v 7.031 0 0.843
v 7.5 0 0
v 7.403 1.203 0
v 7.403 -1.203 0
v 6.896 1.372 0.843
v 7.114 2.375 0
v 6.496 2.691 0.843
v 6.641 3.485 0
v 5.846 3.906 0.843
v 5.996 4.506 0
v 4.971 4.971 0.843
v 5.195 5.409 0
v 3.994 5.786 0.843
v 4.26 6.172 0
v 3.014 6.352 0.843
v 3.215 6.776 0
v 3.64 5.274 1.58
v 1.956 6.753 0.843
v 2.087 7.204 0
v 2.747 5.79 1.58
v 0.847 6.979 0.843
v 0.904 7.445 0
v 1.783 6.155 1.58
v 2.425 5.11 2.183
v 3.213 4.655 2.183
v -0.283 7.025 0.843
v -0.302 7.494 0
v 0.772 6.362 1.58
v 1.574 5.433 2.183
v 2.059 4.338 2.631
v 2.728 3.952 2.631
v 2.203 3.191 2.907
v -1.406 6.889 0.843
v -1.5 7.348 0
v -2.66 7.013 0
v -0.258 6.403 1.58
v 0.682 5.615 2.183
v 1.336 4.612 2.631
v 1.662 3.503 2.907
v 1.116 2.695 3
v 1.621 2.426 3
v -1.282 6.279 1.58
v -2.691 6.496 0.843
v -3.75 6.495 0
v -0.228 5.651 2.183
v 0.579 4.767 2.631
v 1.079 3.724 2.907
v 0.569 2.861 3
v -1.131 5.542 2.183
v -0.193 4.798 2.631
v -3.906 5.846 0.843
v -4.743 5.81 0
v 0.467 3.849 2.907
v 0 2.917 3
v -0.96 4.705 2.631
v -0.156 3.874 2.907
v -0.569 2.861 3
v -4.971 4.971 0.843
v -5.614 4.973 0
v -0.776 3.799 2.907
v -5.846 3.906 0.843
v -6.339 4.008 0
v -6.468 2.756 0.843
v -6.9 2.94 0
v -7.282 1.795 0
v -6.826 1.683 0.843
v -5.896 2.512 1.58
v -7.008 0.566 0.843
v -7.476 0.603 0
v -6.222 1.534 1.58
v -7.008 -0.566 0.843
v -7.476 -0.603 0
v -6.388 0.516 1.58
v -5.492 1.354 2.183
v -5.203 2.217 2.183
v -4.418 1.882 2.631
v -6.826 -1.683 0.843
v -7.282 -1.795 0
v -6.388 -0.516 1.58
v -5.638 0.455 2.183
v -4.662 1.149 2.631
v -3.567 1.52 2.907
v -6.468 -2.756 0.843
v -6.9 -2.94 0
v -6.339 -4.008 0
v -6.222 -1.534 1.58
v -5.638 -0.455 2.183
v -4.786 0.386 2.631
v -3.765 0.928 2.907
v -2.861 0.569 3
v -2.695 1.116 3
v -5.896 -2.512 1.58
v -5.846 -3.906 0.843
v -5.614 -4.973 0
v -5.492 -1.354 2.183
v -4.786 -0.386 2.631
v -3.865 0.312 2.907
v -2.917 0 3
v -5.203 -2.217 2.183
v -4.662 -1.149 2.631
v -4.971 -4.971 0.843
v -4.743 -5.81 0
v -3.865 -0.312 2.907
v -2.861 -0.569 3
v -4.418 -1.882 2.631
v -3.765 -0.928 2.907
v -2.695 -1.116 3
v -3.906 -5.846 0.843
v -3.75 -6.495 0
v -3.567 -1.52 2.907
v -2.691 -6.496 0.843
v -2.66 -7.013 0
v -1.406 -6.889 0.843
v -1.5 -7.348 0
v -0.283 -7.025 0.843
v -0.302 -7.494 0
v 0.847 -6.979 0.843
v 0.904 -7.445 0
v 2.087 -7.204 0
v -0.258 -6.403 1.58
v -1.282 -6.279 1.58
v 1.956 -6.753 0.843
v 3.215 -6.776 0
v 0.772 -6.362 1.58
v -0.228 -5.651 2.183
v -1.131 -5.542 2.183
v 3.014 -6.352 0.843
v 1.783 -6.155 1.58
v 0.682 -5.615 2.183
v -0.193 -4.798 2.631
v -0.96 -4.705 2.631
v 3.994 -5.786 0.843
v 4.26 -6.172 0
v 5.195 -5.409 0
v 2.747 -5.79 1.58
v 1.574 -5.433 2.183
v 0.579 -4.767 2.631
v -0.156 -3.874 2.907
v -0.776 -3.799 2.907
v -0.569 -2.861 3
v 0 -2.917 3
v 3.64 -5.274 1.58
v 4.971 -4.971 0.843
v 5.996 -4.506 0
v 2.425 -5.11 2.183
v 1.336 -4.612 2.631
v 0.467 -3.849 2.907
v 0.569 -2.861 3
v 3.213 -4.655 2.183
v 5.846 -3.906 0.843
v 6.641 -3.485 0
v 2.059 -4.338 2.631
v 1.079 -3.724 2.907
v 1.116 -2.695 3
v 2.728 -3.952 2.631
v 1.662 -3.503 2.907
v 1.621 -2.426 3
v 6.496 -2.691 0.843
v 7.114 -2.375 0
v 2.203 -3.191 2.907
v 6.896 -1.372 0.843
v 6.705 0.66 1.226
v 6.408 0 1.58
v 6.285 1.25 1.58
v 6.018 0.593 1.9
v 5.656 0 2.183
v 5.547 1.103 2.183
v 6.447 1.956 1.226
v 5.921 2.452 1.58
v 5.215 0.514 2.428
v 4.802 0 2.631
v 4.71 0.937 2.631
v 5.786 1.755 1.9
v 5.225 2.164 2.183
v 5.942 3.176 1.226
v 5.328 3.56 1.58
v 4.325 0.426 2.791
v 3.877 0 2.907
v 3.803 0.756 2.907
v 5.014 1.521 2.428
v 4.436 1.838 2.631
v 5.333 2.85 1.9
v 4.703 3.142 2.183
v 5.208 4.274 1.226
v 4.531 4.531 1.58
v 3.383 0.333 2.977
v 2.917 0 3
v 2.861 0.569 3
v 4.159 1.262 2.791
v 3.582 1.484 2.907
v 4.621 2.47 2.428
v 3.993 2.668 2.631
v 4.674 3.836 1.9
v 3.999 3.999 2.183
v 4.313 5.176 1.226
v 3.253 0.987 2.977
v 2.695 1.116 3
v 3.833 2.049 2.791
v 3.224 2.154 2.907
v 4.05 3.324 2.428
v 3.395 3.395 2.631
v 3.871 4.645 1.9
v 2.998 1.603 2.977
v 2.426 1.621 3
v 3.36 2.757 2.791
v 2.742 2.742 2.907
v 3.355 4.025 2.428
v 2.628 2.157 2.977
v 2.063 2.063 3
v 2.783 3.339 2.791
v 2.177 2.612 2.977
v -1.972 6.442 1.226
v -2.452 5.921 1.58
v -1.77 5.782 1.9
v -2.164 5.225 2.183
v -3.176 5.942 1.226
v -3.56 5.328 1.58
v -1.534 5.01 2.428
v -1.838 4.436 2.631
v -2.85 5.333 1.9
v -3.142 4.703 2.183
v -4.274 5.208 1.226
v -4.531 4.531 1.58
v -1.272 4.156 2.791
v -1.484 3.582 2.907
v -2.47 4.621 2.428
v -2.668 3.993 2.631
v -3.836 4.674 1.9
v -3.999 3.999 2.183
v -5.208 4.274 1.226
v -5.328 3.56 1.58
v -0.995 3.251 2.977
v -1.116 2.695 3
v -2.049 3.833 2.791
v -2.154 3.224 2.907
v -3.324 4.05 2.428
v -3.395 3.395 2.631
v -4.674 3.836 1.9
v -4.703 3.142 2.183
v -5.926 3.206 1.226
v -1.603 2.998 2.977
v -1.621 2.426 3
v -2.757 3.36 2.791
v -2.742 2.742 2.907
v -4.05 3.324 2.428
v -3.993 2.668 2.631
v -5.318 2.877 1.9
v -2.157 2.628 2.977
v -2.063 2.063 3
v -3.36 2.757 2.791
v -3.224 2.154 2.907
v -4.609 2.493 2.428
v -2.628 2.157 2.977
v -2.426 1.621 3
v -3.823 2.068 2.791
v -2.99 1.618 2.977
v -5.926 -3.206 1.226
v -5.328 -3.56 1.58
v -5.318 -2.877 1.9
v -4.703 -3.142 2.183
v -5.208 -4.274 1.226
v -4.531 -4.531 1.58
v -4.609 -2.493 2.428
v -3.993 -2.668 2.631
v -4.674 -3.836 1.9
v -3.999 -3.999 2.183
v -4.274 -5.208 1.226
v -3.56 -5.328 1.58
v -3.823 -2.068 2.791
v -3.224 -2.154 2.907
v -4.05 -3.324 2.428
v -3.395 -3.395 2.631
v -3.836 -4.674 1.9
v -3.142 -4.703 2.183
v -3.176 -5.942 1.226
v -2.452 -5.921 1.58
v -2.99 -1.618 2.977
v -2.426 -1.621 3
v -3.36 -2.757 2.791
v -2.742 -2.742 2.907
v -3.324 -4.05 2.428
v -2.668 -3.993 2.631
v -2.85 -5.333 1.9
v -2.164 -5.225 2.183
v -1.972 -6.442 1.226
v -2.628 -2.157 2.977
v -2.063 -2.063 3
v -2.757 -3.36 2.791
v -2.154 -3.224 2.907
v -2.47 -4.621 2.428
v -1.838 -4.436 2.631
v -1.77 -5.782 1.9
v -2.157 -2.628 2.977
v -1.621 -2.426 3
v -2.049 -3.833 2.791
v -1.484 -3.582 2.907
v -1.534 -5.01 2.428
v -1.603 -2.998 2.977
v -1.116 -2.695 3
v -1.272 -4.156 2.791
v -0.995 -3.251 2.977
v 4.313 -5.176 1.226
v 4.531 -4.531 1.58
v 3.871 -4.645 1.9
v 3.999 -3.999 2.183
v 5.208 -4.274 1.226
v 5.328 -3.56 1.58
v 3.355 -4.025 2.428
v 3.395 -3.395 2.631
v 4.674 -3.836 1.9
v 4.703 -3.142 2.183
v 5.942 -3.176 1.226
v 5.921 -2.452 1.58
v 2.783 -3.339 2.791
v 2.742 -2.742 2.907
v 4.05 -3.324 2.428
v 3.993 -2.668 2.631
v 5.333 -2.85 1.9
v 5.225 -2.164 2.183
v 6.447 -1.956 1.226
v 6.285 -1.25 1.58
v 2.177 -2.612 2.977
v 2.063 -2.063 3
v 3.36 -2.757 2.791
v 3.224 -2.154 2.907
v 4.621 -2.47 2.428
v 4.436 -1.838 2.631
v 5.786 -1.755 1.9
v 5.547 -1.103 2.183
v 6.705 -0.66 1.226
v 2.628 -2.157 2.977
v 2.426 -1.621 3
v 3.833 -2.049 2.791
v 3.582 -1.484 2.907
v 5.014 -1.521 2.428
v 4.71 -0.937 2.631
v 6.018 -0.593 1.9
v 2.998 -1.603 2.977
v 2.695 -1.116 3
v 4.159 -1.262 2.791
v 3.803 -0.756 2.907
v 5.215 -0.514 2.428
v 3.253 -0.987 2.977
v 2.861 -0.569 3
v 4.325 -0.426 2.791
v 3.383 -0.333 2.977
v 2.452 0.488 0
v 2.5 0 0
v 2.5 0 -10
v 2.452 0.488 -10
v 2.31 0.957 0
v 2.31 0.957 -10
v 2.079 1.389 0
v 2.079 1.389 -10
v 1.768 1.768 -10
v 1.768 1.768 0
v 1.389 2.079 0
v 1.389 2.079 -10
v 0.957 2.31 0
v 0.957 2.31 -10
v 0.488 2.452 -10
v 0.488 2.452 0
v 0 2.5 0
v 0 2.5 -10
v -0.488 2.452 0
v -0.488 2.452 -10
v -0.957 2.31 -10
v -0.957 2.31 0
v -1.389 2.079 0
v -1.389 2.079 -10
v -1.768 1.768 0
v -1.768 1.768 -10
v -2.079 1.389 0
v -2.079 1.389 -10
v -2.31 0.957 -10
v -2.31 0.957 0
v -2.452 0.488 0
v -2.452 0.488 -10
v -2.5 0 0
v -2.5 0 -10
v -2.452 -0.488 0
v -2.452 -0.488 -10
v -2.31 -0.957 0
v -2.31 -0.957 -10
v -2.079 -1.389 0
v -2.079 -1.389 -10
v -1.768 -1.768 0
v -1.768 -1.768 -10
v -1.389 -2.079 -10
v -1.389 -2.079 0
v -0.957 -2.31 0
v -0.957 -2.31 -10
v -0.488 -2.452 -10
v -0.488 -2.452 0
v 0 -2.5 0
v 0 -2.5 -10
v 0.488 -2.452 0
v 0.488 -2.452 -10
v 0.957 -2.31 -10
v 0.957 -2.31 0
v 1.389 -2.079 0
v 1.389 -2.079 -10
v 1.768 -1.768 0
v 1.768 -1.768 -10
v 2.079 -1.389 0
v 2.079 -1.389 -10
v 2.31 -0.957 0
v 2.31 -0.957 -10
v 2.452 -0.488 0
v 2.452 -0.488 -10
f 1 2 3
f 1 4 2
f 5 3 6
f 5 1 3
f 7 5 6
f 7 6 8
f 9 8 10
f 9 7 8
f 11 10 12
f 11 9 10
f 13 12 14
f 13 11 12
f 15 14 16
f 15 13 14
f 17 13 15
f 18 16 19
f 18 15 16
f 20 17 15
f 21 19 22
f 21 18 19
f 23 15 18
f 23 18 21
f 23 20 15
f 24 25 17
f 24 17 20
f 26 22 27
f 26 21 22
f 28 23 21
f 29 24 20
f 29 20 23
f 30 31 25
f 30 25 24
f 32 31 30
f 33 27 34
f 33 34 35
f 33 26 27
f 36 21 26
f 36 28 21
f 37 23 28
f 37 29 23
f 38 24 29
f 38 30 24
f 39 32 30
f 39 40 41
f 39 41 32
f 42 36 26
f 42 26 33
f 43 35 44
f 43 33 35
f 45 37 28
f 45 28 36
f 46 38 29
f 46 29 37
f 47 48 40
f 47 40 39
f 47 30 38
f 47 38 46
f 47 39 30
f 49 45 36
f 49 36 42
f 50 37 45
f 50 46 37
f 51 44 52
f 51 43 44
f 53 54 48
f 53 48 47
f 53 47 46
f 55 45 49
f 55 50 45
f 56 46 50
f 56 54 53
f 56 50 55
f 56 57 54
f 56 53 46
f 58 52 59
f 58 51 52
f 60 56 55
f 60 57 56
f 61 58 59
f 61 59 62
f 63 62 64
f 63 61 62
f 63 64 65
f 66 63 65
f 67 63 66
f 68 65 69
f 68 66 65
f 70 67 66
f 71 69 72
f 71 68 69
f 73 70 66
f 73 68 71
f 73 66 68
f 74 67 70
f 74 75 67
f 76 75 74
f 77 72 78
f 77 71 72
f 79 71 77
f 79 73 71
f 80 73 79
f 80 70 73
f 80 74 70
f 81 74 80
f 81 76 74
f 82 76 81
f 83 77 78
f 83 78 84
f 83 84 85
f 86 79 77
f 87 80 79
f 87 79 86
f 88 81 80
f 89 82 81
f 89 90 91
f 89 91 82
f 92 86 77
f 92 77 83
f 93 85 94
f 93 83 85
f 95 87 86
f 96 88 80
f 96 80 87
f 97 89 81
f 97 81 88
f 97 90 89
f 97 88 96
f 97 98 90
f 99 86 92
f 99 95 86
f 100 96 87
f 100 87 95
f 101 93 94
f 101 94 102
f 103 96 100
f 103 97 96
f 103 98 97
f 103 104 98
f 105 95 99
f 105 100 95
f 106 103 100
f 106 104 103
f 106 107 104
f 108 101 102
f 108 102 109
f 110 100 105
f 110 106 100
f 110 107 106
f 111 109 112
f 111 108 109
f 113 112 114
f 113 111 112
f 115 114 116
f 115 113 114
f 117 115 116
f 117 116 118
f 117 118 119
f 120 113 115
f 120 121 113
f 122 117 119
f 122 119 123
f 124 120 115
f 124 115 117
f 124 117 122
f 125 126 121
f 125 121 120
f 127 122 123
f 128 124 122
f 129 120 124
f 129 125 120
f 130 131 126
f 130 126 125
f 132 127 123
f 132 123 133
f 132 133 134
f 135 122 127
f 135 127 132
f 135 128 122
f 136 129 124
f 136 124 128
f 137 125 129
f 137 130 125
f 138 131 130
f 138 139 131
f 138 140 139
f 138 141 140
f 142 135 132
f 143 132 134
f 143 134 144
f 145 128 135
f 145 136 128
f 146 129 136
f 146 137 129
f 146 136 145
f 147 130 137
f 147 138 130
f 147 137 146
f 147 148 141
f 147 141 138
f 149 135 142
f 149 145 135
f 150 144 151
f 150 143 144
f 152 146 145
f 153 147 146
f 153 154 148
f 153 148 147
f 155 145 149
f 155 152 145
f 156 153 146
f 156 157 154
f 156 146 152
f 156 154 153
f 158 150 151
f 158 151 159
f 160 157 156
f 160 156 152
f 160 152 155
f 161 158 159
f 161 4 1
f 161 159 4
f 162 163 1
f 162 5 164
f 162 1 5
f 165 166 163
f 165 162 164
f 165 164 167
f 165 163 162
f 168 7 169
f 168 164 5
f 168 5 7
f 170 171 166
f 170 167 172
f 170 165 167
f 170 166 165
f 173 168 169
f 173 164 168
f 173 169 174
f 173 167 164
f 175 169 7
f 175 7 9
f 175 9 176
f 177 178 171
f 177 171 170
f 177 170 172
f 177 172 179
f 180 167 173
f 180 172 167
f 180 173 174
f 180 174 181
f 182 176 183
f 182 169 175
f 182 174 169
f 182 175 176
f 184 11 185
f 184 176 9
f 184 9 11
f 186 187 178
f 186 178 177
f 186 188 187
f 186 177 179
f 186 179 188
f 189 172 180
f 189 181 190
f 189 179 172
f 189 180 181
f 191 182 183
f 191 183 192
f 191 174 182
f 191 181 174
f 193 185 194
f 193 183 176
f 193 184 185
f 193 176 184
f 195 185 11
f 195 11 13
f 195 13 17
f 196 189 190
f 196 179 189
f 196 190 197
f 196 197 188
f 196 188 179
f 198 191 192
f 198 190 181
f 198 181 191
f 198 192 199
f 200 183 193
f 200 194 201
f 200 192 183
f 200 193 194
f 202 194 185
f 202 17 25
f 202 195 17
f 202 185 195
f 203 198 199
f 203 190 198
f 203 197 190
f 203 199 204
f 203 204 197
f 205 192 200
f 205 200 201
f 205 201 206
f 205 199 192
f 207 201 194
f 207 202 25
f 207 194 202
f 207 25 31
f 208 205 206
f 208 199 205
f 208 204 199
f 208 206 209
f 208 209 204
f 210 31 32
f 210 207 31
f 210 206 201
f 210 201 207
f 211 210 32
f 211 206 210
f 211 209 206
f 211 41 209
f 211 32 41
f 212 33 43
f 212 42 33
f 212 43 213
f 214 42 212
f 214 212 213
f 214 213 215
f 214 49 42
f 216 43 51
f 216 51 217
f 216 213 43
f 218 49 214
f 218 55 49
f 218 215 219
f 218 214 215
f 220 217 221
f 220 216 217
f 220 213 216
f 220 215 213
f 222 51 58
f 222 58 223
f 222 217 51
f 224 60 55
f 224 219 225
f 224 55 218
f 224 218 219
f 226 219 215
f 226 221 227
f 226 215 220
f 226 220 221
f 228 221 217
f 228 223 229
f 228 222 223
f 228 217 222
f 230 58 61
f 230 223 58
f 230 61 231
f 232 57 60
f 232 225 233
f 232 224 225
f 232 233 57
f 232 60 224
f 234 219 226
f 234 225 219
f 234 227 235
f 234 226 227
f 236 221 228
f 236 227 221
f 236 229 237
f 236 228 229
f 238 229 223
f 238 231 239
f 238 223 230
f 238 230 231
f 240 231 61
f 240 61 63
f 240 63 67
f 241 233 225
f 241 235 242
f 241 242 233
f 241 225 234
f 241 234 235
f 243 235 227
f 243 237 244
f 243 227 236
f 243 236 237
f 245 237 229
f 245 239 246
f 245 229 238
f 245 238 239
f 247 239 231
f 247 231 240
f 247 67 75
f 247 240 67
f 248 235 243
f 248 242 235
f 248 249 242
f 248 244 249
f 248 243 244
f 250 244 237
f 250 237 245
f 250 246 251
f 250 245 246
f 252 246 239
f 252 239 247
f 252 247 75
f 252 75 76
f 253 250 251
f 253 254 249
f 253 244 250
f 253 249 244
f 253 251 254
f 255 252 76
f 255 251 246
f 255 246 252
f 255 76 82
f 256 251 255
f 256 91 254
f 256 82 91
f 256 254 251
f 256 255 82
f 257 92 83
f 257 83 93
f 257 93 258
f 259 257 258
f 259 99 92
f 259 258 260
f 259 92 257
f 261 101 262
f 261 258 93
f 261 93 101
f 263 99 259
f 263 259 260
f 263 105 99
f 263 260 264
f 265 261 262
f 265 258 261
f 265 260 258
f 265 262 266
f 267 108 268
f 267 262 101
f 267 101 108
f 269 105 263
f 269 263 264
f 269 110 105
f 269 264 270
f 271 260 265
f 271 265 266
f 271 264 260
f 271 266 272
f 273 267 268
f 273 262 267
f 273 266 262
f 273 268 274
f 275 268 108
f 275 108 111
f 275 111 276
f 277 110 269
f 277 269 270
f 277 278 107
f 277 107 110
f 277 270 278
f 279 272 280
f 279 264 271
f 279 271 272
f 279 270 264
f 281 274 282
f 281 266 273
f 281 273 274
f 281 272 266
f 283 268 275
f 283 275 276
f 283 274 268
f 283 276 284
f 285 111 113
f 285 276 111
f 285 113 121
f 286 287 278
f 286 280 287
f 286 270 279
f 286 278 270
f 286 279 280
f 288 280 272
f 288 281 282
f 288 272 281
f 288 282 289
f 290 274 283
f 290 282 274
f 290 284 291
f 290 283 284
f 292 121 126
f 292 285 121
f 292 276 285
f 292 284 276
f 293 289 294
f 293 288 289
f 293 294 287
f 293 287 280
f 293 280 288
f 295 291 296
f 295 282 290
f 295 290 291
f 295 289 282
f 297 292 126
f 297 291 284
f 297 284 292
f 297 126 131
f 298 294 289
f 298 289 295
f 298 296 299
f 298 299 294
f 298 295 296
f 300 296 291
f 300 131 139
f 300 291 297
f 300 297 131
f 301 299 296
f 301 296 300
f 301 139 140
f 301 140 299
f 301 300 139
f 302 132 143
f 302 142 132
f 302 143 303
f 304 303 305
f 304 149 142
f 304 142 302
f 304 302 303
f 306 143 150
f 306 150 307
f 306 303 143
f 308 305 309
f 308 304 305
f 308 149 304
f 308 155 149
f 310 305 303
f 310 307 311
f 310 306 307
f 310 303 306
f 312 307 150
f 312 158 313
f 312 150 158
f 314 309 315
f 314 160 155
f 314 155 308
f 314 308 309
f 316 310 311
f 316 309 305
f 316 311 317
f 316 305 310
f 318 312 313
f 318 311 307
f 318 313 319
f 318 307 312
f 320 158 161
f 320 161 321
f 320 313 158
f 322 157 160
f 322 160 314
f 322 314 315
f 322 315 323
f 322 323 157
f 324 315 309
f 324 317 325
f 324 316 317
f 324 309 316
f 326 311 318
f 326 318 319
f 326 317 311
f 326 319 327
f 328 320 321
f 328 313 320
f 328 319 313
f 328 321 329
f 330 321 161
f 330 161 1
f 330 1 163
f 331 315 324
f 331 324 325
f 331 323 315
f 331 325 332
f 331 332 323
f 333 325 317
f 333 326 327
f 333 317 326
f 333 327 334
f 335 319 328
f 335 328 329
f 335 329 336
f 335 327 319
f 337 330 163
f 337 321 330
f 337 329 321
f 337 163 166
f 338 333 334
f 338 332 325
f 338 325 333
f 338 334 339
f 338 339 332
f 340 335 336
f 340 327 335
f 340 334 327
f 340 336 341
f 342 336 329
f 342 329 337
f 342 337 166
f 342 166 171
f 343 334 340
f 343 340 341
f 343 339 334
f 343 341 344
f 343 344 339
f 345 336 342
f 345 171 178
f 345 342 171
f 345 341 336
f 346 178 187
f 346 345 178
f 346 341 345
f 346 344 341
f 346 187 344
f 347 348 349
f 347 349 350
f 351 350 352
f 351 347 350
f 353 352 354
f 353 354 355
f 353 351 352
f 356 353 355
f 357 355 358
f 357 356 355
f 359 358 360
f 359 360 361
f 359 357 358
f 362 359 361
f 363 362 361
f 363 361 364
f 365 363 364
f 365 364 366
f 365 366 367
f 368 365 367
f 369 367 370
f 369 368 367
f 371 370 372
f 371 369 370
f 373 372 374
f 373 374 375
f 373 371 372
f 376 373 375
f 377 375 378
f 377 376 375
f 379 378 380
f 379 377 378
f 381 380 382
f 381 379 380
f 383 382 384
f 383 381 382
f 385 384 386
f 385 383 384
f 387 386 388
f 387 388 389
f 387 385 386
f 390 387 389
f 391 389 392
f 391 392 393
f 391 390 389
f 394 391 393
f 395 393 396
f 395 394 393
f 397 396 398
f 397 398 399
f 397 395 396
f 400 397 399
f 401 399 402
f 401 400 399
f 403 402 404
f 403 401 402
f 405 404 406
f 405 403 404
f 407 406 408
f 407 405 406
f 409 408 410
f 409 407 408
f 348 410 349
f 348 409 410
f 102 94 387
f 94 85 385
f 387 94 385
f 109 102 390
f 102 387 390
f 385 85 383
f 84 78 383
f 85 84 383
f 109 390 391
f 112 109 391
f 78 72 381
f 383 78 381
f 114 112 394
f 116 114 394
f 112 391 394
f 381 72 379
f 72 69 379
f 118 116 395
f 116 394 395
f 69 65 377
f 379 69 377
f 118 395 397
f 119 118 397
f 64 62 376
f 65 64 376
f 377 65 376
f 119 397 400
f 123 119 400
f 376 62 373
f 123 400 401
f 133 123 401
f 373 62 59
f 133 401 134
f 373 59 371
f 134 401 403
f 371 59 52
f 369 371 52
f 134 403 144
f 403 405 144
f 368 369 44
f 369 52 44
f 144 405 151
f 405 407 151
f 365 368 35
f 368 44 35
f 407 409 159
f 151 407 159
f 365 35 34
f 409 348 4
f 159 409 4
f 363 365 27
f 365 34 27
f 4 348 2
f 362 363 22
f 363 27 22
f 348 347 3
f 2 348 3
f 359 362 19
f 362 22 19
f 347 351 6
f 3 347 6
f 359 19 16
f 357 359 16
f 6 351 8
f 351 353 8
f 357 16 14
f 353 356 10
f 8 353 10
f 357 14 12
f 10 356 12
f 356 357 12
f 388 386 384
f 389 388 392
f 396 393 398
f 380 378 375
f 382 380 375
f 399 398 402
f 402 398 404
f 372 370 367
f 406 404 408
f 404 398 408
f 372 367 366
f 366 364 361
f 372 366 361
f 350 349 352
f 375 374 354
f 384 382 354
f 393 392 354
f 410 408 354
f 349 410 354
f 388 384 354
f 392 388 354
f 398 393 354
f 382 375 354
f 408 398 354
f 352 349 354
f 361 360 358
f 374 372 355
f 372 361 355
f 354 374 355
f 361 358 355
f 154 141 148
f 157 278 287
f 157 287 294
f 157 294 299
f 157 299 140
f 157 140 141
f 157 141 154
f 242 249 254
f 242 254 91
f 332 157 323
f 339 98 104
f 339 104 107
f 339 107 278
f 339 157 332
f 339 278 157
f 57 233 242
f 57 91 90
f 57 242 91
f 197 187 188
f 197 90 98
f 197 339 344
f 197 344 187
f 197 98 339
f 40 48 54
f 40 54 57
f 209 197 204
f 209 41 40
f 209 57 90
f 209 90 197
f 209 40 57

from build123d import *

# Parameters (mm, degrees)
F0_R     = 7.5
F1_DEPTH = 3
F3_R     = 2.5
F4_DEPTH = 10


# Not quite as in the source:
# - a fillet or chamfer that OpenCascade refuses, or shapes differently, is made with other operations: its cross-section is extruded or revolved along the edge and cut away or added


with BuildPart() as f1:
    # F0 (on Top) → F1 (new body)
    with BuildSketch(Plane.XY):
        Circle(F0_R)
    extrude(amount=F1_DEPTH)

    # F2: fillet of radius 5 on 1 edges, made by hand

    # F2_s1 → F2_t2 (revolve, cut)
    with BuildSketch(Plane.XZ):
        with BuildLine():
            ThreePointArc((7.5, 0), (5.6560370926, 2.1833001327), (2.917424305, 3))
            Line((2.917424305, 3), (7.5, 3))
            Line((7.5, 3), (7.5, 0))
        make_face()
    revolve(axis=Axis((0, 0, 3), (0, 0, 1)), mode=Mode.SUBTRACT)

    # F3 (on Top) → F4 (join)
    with BuildSketch(Plane.XY):
        Circle(F3_R)
    extrude(amount=-F4_DEPTH)


solid = f1.part
